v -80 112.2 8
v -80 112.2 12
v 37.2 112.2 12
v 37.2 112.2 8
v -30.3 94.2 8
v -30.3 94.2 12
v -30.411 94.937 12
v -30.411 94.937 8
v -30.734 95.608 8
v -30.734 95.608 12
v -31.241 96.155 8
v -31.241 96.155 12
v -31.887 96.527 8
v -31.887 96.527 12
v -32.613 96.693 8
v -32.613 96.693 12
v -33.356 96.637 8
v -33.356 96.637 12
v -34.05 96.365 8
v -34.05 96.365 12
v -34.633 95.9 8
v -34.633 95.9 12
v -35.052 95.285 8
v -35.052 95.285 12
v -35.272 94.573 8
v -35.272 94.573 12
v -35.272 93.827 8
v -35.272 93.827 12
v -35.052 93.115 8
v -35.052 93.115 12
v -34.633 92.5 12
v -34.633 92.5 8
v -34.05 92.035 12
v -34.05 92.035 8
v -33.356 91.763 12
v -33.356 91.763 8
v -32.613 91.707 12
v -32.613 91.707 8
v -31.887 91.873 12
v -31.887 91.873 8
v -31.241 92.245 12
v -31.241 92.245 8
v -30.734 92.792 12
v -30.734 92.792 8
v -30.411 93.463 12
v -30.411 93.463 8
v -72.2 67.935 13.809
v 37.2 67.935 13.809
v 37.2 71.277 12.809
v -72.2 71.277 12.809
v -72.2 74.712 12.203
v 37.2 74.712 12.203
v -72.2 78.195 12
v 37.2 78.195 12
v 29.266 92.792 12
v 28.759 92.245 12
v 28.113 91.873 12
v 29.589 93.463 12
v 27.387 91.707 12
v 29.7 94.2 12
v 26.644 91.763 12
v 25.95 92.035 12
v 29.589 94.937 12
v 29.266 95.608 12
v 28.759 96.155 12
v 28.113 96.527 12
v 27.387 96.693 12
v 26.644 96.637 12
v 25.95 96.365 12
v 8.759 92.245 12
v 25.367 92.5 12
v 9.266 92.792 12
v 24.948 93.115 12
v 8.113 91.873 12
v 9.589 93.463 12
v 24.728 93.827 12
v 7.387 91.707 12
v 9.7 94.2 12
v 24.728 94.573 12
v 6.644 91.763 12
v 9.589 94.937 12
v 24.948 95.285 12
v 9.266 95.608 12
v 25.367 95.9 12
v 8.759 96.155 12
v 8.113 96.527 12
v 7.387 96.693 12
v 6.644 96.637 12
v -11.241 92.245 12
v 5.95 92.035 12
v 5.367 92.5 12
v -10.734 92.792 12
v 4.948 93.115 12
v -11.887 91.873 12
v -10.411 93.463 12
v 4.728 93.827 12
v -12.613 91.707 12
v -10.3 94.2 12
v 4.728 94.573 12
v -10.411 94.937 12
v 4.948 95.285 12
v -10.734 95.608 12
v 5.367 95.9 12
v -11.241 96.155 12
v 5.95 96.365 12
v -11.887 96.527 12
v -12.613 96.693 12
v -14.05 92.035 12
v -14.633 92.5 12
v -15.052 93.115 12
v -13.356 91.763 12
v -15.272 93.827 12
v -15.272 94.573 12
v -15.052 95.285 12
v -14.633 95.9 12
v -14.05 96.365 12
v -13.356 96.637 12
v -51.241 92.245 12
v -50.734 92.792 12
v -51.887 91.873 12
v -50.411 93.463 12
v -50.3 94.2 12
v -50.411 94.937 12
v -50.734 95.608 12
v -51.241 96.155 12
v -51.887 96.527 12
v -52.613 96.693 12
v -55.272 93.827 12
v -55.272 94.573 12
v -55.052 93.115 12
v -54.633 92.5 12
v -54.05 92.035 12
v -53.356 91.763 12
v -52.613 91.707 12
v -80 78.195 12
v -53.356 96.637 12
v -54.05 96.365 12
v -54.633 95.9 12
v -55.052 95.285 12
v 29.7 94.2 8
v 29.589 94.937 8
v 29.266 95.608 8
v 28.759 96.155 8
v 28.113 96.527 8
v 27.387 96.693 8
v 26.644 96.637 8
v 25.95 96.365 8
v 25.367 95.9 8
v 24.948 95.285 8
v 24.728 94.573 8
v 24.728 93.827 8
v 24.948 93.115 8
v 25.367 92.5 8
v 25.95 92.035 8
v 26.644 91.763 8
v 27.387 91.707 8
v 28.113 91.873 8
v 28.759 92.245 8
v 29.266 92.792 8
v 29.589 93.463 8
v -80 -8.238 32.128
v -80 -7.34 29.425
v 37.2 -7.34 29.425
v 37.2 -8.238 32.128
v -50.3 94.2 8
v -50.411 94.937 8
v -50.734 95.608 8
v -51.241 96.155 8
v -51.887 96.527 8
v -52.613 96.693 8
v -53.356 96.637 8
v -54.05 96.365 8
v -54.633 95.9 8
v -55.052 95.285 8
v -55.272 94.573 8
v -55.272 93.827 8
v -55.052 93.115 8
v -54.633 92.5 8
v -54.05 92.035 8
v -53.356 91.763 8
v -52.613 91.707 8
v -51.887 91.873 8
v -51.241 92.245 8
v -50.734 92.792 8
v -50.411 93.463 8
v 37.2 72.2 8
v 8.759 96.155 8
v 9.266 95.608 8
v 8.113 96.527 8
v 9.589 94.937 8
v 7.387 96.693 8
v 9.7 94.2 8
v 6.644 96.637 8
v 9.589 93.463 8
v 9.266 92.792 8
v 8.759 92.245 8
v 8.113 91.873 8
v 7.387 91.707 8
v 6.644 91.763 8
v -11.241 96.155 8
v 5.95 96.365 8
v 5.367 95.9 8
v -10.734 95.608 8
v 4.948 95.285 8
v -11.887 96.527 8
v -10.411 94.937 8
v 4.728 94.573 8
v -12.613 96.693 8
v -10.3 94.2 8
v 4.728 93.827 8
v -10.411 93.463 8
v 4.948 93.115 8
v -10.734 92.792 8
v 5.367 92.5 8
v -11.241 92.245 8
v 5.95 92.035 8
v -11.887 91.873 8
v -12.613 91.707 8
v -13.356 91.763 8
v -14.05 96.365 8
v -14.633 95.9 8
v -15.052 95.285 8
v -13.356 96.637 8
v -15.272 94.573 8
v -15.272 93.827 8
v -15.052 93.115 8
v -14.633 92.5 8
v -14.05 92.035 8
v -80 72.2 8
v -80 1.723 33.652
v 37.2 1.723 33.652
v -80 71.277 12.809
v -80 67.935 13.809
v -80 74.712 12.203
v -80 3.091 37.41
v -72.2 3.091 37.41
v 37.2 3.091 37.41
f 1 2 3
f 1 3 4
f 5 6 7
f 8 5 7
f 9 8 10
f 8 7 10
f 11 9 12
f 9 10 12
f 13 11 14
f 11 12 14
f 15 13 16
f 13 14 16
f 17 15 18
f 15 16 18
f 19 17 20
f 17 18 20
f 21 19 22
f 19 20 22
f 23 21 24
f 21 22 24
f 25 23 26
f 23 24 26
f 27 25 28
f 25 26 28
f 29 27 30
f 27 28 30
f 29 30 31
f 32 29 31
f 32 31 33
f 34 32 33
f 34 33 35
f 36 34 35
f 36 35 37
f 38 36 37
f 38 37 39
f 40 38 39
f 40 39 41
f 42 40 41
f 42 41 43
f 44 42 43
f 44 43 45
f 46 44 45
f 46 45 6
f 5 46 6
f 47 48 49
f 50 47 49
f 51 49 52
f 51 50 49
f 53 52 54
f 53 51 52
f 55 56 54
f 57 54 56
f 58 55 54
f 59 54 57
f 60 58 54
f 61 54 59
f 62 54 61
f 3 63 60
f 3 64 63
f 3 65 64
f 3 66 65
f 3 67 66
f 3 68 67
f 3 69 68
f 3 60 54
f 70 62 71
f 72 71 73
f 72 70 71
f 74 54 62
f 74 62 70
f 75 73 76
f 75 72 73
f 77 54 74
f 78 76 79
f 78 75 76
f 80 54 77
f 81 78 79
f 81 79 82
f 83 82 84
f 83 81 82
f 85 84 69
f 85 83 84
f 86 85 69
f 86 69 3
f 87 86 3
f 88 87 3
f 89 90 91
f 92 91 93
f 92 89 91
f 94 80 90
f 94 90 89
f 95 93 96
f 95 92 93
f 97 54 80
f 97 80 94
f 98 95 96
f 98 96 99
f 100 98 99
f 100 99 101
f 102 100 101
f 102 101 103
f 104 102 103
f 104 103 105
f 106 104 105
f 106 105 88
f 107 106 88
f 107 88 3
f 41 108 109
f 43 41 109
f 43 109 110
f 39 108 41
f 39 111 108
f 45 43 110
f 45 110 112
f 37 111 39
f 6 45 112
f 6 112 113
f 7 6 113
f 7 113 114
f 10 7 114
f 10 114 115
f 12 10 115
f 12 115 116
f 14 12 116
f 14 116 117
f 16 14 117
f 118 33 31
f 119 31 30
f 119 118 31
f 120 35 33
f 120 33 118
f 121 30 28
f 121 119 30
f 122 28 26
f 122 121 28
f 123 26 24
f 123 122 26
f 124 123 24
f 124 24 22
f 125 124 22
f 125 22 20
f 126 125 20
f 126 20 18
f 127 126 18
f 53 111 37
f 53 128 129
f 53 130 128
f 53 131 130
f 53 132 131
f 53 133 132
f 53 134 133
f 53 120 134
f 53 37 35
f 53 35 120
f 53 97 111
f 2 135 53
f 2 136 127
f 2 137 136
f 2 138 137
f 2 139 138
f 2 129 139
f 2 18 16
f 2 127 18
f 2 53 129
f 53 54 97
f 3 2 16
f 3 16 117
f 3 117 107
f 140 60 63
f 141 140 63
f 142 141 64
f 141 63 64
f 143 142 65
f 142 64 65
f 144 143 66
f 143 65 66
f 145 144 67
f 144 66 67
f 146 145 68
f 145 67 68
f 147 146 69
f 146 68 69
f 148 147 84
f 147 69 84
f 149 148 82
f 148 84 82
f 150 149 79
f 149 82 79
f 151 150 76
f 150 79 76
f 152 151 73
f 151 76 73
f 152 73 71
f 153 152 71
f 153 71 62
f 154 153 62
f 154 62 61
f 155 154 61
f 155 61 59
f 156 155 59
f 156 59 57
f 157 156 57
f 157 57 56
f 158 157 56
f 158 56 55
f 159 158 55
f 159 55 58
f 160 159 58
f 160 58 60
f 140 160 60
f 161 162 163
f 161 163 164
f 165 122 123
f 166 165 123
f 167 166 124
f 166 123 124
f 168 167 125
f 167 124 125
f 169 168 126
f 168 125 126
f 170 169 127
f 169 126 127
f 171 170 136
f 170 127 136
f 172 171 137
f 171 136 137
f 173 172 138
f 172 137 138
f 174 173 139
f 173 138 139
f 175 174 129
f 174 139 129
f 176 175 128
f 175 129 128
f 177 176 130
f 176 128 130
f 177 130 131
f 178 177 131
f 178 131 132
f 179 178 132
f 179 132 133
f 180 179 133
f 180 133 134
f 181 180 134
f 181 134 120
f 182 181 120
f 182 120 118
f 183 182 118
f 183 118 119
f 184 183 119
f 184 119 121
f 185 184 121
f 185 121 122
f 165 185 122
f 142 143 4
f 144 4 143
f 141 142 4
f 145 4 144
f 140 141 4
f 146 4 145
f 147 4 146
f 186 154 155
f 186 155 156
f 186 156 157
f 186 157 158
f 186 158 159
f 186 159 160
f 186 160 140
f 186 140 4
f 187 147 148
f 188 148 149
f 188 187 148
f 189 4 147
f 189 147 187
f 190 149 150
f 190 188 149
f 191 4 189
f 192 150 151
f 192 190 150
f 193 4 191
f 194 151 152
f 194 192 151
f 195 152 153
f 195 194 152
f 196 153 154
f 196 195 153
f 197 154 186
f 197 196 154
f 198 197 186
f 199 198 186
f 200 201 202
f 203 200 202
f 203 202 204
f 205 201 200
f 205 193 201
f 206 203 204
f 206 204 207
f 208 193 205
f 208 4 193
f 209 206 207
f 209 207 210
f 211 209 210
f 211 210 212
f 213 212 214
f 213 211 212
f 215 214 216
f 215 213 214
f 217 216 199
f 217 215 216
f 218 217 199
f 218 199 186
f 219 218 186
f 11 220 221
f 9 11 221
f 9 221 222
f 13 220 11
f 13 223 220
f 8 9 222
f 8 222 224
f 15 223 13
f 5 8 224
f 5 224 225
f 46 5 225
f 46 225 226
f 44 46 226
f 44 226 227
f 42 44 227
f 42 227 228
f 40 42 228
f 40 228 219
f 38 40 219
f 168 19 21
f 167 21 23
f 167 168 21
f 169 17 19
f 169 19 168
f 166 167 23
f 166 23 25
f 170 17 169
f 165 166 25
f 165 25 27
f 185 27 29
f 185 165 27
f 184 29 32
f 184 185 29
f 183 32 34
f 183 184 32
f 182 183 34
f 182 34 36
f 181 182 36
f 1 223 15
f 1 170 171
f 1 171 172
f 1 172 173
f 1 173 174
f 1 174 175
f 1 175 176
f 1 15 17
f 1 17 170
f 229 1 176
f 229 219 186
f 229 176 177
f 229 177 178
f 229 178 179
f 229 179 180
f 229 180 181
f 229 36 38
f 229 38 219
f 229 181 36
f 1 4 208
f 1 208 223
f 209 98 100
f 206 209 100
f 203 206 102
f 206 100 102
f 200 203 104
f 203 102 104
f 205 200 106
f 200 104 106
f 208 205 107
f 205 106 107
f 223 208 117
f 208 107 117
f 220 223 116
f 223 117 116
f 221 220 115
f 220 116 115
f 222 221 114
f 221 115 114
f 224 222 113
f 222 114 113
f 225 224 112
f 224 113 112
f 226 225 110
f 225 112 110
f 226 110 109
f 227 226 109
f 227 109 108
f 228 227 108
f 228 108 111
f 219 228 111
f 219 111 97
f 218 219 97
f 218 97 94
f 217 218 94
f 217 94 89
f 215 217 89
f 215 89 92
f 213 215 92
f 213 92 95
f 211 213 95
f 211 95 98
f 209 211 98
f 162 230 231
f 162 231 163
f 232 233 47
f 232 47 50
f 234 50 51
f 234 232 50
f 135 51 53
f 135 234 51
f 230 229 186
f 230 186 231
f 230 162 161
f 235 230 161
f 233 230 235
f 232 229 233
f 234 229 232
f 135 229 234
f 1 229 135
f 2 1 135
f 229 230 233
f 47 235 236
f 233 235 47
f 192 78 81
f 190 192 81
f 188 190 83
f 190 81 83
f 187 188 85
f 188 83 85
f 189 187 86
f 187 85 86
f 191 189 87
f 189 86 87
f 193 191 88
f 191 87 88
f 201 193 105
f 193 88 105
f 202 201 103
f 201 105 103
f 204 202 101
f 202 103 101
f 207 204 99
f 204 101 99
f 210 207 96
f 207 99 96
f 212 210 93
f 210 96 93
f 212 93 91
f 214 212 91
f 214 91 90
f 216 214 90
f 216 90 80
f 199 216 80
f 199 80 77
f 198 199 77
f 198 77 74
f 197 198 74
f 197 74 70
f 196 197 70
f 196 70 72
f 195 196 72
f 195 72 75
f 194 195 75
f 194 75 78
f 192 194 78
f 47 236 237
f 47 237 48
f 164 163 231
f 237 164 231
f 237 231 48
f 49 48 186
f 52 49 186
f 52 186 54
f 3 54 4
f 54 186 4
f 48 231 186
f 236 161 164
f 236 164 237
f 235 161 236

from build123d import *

# Parameters (mm, degrees)
SKETCH1_W           = 109.4
SKETCH1_H           = 109.4
SKETCH1_W_2         = 79.4
SKETCH1_H_2         = 79.4
SKETCH1_R           = 6
SKETCH1_R_2         = 1.5
BOSS_EXTRUDE1_DEPTH = 8
BOSS_EXTRUDE2_DEPTH = 109.4
FILLET1_R           = 30
SKETCH5_W           = 8
SKETCH5_H           = 149.4
BOSS_EXTRUDE3_DEPTH = 109.4
SKETCH3_W           = 8
SKETCH3_H           = 109.4
CUT_EXTRUDE4_DEPTH  = 135
SKETCH7_W           = 8
SKETCH7_H           = 40
CUT_EXTRUDE5_DEPTH  = 135
SKETCH4_R           = 2.5
CUT_EXTRUDE6_DEPTH  = 10
BOSS_EXTRUDE4_START = 7.8
BOSS_EXTRUDE4_DEPTH = 7.8


with BuildPart() as part:
    # Sketch1 → Boss-Extrude1 (new body)
    # profile 1 of 2: a face of its own
    with BuildSketch(Plane.XY):
        with Locations((-17.5, 17.5)):
            Rectangle(SKETCH1_W, SKETCH1_H)
        with Locations((-17.5, 17.5)):
            Rectangle(SKETCH1_W_2, SKETCH1_H_2, mode=Mode.SUBTRACT)
    # profile 2 of 2: a face of its own
    with BuildSketch(Plane.XY):
        with Locations((-17.5, 17.5)):
            Rectangle(SKETCH1_W_2, SKETCH1_H_2)
        with Locations((-35, 0)):
            Circle(SKETCH1_R, mode=Mode.SUBTRACT)
        Circle(SKETCH1_R, mode=Mode.SUBTRACT)
        with Locations((0, 35)):
            Circle(SKETCH1_R, mode=Mode.SUBTRACT)
        with Locations((-35, 35)):
            Circle(SKETCH1_R, mode=Mode.SUBTRACT)
        with Locations((-52.809903828, -17.809903828)):
            Circle(SKETCH1_R_2, mode=Mode.SUBTRACT)
        with Locations((-17.5, -17.5)):
            Circle(SKETCH1_R_2, mode=Mode.SUBTRACT)
        with Locations((17.5, -17.5)):
            Circle(SKETCH1_R_2, mode=Mode.SUBTRACT)
        with Locations((17.5, 17.5)):
            Circle(SKETCH1_R_2, mode=Mode.SUBTRACT)
        with Locations((-17.5, 17.5)):
            Circle(SKETCH1_R_2, mode=Mode.SUBTRACT)
        with Locations((-52.5, 17.5)):
            Circle(SKETCH1_R_2, mode=Mode.SUBTRACT)
        with Locations((17.5, 52.5)):
            Circle(SKETCH1_R_2, mode=Mode.SUBTRACT)
        with Locations((-17.5, 52.5)):
            Circle(SKETCH1_R_2, mode=Mode.SUBTRACT)
        with Locations((-52.5, 52.5)):
            Circle(SKETCH1_R_2, mode=Mode.SUBTRACT)
    extrude(amount=BOSS_EXTRUDE1_DEPTH)



with BuildPart() as body_2:
    # Sketch2 → Boss-Extrude2 (new body)
    with BuildSketch(Plane(origin=(37.2, 0, 0), x_dir=(0, 0, -1), z_dir=(1, 0, 0))):
        Polygon((-8, 72.2), (-33.651510749, 1.723053441), (-29.425328132, -7.340024429), (-32.127552961, -8.237713324), (-37.410281233, 3.091134014), (-12, 72.905307923), (-12, 112.2), (-8, 112.2), align=None)
    extrude(amount=-BOSS_EXTRUDE2_DEPTH)

    # Fillet1
    fillet1_edges = [body_2.edges().sort_by_distance(p)[0] for p in [
        (-17.5, 72.905307923, 12),
    ]]
    fillet(fillet1_edges, radius=FILLET1_R)


with BuildPart() as part_1:
    add(part.part)

    add(body_2.part)  # Boss-Extrude3 merges body 2
    # Sketch5 → Boss-Extrude3 (add)
    with BuildSketch(Plane(origin=(37.2, 0, 0), x_dir=(0, 0, -1), z_dir=(1, 0, 0))):
        with Locations((-4, 37.5)):
            Rectangle(SKETCH5_W, SKETCH5_H)
    extrude(amount=-BOSS_EXTRUDE3_DEPTH)

    # Sketch3 → Cut-Extrude4 (cut)
    with BuildSketch(Plane(origin=(37.2, 0, 0), x_dir=(0, 0, -1), z_dir=(1, 0, 0))):
        with Locations((-4, 17.5)):
            Rectangle(SKETCH3_W, SKETCH3_H)
    extrude(amount=-CUT_EXTRUDE4_DEPTH, mode=Mode.SUBTRACT)

    # Sketch7 → Cut-Extrude5 (cut)
    with BuildSketch(Plane(origin=(37.2, 0, 0), x_dir=(0, 0, -1), z_dir=(1, 0, 0))):
        with Locations((-4, 92.2)):
            Rectangle(SKETCH7_W, SKETCH7_H)
    extrude(amount=-CUT_EXTRUDE5_DEPTH, mode=Mode.SUBTRACT)

    # Sketch4 → Cut-Extrude6 (cut)
    with BuildSketch(Plane.XY.offset(12)):
        with Locations((-52.8, 94.2)):
            Circle(SKETCH4_R)
        with Locations((-32.8, 94.2)):
            Circle(SKETCH4_R)
        with Locations((-12.8, 94.2)):
            Circle(SKETCH4_R)
        with Locations((7.2, 94.2)):
            Circle(SKETCH4_R)
        with Locations((27.2, 94.2)):
            Circle(SKETCH4_R)
    extrude(amount=-CUT_EXTRUDE6_DEPTH, mode=Mode.SUBTRACT)

    # Sketch8 → Boss-Extrude4 (add)
    with BuildSketch(Plane.ZY.offset(72.2).offset(BOSS_EXTRUDE4_START)):
        with BuildLine():
            Line((12, 112.2), (8, 112.2))
            Line((8, 112.2), (8, 72.2))
            Line((8, 72.2), (33.651510749, 1.723053441))
            Line((33.651510749, 1.723053441), (29.425328132, -7.340024429))
            Line((29.425328132, -7.340024429), (32.127552961, -8.237713324))
            Line((32.127552961, -8.237713324), (37.410281233, 3.091134014))
            Line((37.410281233, 3.091134014), (13.809221376, 67.934513044))
            ThreePointArc((13.809221376, 67.934513044), (12.45576741, 72.985672014), (12, 78.195117344))
            Line((12, 78.195117344), (12, 112.2))
        make_face()
    extrude(amount=-BOSS_EXTRUDE4_DEPTH)


solid = part_1.part
